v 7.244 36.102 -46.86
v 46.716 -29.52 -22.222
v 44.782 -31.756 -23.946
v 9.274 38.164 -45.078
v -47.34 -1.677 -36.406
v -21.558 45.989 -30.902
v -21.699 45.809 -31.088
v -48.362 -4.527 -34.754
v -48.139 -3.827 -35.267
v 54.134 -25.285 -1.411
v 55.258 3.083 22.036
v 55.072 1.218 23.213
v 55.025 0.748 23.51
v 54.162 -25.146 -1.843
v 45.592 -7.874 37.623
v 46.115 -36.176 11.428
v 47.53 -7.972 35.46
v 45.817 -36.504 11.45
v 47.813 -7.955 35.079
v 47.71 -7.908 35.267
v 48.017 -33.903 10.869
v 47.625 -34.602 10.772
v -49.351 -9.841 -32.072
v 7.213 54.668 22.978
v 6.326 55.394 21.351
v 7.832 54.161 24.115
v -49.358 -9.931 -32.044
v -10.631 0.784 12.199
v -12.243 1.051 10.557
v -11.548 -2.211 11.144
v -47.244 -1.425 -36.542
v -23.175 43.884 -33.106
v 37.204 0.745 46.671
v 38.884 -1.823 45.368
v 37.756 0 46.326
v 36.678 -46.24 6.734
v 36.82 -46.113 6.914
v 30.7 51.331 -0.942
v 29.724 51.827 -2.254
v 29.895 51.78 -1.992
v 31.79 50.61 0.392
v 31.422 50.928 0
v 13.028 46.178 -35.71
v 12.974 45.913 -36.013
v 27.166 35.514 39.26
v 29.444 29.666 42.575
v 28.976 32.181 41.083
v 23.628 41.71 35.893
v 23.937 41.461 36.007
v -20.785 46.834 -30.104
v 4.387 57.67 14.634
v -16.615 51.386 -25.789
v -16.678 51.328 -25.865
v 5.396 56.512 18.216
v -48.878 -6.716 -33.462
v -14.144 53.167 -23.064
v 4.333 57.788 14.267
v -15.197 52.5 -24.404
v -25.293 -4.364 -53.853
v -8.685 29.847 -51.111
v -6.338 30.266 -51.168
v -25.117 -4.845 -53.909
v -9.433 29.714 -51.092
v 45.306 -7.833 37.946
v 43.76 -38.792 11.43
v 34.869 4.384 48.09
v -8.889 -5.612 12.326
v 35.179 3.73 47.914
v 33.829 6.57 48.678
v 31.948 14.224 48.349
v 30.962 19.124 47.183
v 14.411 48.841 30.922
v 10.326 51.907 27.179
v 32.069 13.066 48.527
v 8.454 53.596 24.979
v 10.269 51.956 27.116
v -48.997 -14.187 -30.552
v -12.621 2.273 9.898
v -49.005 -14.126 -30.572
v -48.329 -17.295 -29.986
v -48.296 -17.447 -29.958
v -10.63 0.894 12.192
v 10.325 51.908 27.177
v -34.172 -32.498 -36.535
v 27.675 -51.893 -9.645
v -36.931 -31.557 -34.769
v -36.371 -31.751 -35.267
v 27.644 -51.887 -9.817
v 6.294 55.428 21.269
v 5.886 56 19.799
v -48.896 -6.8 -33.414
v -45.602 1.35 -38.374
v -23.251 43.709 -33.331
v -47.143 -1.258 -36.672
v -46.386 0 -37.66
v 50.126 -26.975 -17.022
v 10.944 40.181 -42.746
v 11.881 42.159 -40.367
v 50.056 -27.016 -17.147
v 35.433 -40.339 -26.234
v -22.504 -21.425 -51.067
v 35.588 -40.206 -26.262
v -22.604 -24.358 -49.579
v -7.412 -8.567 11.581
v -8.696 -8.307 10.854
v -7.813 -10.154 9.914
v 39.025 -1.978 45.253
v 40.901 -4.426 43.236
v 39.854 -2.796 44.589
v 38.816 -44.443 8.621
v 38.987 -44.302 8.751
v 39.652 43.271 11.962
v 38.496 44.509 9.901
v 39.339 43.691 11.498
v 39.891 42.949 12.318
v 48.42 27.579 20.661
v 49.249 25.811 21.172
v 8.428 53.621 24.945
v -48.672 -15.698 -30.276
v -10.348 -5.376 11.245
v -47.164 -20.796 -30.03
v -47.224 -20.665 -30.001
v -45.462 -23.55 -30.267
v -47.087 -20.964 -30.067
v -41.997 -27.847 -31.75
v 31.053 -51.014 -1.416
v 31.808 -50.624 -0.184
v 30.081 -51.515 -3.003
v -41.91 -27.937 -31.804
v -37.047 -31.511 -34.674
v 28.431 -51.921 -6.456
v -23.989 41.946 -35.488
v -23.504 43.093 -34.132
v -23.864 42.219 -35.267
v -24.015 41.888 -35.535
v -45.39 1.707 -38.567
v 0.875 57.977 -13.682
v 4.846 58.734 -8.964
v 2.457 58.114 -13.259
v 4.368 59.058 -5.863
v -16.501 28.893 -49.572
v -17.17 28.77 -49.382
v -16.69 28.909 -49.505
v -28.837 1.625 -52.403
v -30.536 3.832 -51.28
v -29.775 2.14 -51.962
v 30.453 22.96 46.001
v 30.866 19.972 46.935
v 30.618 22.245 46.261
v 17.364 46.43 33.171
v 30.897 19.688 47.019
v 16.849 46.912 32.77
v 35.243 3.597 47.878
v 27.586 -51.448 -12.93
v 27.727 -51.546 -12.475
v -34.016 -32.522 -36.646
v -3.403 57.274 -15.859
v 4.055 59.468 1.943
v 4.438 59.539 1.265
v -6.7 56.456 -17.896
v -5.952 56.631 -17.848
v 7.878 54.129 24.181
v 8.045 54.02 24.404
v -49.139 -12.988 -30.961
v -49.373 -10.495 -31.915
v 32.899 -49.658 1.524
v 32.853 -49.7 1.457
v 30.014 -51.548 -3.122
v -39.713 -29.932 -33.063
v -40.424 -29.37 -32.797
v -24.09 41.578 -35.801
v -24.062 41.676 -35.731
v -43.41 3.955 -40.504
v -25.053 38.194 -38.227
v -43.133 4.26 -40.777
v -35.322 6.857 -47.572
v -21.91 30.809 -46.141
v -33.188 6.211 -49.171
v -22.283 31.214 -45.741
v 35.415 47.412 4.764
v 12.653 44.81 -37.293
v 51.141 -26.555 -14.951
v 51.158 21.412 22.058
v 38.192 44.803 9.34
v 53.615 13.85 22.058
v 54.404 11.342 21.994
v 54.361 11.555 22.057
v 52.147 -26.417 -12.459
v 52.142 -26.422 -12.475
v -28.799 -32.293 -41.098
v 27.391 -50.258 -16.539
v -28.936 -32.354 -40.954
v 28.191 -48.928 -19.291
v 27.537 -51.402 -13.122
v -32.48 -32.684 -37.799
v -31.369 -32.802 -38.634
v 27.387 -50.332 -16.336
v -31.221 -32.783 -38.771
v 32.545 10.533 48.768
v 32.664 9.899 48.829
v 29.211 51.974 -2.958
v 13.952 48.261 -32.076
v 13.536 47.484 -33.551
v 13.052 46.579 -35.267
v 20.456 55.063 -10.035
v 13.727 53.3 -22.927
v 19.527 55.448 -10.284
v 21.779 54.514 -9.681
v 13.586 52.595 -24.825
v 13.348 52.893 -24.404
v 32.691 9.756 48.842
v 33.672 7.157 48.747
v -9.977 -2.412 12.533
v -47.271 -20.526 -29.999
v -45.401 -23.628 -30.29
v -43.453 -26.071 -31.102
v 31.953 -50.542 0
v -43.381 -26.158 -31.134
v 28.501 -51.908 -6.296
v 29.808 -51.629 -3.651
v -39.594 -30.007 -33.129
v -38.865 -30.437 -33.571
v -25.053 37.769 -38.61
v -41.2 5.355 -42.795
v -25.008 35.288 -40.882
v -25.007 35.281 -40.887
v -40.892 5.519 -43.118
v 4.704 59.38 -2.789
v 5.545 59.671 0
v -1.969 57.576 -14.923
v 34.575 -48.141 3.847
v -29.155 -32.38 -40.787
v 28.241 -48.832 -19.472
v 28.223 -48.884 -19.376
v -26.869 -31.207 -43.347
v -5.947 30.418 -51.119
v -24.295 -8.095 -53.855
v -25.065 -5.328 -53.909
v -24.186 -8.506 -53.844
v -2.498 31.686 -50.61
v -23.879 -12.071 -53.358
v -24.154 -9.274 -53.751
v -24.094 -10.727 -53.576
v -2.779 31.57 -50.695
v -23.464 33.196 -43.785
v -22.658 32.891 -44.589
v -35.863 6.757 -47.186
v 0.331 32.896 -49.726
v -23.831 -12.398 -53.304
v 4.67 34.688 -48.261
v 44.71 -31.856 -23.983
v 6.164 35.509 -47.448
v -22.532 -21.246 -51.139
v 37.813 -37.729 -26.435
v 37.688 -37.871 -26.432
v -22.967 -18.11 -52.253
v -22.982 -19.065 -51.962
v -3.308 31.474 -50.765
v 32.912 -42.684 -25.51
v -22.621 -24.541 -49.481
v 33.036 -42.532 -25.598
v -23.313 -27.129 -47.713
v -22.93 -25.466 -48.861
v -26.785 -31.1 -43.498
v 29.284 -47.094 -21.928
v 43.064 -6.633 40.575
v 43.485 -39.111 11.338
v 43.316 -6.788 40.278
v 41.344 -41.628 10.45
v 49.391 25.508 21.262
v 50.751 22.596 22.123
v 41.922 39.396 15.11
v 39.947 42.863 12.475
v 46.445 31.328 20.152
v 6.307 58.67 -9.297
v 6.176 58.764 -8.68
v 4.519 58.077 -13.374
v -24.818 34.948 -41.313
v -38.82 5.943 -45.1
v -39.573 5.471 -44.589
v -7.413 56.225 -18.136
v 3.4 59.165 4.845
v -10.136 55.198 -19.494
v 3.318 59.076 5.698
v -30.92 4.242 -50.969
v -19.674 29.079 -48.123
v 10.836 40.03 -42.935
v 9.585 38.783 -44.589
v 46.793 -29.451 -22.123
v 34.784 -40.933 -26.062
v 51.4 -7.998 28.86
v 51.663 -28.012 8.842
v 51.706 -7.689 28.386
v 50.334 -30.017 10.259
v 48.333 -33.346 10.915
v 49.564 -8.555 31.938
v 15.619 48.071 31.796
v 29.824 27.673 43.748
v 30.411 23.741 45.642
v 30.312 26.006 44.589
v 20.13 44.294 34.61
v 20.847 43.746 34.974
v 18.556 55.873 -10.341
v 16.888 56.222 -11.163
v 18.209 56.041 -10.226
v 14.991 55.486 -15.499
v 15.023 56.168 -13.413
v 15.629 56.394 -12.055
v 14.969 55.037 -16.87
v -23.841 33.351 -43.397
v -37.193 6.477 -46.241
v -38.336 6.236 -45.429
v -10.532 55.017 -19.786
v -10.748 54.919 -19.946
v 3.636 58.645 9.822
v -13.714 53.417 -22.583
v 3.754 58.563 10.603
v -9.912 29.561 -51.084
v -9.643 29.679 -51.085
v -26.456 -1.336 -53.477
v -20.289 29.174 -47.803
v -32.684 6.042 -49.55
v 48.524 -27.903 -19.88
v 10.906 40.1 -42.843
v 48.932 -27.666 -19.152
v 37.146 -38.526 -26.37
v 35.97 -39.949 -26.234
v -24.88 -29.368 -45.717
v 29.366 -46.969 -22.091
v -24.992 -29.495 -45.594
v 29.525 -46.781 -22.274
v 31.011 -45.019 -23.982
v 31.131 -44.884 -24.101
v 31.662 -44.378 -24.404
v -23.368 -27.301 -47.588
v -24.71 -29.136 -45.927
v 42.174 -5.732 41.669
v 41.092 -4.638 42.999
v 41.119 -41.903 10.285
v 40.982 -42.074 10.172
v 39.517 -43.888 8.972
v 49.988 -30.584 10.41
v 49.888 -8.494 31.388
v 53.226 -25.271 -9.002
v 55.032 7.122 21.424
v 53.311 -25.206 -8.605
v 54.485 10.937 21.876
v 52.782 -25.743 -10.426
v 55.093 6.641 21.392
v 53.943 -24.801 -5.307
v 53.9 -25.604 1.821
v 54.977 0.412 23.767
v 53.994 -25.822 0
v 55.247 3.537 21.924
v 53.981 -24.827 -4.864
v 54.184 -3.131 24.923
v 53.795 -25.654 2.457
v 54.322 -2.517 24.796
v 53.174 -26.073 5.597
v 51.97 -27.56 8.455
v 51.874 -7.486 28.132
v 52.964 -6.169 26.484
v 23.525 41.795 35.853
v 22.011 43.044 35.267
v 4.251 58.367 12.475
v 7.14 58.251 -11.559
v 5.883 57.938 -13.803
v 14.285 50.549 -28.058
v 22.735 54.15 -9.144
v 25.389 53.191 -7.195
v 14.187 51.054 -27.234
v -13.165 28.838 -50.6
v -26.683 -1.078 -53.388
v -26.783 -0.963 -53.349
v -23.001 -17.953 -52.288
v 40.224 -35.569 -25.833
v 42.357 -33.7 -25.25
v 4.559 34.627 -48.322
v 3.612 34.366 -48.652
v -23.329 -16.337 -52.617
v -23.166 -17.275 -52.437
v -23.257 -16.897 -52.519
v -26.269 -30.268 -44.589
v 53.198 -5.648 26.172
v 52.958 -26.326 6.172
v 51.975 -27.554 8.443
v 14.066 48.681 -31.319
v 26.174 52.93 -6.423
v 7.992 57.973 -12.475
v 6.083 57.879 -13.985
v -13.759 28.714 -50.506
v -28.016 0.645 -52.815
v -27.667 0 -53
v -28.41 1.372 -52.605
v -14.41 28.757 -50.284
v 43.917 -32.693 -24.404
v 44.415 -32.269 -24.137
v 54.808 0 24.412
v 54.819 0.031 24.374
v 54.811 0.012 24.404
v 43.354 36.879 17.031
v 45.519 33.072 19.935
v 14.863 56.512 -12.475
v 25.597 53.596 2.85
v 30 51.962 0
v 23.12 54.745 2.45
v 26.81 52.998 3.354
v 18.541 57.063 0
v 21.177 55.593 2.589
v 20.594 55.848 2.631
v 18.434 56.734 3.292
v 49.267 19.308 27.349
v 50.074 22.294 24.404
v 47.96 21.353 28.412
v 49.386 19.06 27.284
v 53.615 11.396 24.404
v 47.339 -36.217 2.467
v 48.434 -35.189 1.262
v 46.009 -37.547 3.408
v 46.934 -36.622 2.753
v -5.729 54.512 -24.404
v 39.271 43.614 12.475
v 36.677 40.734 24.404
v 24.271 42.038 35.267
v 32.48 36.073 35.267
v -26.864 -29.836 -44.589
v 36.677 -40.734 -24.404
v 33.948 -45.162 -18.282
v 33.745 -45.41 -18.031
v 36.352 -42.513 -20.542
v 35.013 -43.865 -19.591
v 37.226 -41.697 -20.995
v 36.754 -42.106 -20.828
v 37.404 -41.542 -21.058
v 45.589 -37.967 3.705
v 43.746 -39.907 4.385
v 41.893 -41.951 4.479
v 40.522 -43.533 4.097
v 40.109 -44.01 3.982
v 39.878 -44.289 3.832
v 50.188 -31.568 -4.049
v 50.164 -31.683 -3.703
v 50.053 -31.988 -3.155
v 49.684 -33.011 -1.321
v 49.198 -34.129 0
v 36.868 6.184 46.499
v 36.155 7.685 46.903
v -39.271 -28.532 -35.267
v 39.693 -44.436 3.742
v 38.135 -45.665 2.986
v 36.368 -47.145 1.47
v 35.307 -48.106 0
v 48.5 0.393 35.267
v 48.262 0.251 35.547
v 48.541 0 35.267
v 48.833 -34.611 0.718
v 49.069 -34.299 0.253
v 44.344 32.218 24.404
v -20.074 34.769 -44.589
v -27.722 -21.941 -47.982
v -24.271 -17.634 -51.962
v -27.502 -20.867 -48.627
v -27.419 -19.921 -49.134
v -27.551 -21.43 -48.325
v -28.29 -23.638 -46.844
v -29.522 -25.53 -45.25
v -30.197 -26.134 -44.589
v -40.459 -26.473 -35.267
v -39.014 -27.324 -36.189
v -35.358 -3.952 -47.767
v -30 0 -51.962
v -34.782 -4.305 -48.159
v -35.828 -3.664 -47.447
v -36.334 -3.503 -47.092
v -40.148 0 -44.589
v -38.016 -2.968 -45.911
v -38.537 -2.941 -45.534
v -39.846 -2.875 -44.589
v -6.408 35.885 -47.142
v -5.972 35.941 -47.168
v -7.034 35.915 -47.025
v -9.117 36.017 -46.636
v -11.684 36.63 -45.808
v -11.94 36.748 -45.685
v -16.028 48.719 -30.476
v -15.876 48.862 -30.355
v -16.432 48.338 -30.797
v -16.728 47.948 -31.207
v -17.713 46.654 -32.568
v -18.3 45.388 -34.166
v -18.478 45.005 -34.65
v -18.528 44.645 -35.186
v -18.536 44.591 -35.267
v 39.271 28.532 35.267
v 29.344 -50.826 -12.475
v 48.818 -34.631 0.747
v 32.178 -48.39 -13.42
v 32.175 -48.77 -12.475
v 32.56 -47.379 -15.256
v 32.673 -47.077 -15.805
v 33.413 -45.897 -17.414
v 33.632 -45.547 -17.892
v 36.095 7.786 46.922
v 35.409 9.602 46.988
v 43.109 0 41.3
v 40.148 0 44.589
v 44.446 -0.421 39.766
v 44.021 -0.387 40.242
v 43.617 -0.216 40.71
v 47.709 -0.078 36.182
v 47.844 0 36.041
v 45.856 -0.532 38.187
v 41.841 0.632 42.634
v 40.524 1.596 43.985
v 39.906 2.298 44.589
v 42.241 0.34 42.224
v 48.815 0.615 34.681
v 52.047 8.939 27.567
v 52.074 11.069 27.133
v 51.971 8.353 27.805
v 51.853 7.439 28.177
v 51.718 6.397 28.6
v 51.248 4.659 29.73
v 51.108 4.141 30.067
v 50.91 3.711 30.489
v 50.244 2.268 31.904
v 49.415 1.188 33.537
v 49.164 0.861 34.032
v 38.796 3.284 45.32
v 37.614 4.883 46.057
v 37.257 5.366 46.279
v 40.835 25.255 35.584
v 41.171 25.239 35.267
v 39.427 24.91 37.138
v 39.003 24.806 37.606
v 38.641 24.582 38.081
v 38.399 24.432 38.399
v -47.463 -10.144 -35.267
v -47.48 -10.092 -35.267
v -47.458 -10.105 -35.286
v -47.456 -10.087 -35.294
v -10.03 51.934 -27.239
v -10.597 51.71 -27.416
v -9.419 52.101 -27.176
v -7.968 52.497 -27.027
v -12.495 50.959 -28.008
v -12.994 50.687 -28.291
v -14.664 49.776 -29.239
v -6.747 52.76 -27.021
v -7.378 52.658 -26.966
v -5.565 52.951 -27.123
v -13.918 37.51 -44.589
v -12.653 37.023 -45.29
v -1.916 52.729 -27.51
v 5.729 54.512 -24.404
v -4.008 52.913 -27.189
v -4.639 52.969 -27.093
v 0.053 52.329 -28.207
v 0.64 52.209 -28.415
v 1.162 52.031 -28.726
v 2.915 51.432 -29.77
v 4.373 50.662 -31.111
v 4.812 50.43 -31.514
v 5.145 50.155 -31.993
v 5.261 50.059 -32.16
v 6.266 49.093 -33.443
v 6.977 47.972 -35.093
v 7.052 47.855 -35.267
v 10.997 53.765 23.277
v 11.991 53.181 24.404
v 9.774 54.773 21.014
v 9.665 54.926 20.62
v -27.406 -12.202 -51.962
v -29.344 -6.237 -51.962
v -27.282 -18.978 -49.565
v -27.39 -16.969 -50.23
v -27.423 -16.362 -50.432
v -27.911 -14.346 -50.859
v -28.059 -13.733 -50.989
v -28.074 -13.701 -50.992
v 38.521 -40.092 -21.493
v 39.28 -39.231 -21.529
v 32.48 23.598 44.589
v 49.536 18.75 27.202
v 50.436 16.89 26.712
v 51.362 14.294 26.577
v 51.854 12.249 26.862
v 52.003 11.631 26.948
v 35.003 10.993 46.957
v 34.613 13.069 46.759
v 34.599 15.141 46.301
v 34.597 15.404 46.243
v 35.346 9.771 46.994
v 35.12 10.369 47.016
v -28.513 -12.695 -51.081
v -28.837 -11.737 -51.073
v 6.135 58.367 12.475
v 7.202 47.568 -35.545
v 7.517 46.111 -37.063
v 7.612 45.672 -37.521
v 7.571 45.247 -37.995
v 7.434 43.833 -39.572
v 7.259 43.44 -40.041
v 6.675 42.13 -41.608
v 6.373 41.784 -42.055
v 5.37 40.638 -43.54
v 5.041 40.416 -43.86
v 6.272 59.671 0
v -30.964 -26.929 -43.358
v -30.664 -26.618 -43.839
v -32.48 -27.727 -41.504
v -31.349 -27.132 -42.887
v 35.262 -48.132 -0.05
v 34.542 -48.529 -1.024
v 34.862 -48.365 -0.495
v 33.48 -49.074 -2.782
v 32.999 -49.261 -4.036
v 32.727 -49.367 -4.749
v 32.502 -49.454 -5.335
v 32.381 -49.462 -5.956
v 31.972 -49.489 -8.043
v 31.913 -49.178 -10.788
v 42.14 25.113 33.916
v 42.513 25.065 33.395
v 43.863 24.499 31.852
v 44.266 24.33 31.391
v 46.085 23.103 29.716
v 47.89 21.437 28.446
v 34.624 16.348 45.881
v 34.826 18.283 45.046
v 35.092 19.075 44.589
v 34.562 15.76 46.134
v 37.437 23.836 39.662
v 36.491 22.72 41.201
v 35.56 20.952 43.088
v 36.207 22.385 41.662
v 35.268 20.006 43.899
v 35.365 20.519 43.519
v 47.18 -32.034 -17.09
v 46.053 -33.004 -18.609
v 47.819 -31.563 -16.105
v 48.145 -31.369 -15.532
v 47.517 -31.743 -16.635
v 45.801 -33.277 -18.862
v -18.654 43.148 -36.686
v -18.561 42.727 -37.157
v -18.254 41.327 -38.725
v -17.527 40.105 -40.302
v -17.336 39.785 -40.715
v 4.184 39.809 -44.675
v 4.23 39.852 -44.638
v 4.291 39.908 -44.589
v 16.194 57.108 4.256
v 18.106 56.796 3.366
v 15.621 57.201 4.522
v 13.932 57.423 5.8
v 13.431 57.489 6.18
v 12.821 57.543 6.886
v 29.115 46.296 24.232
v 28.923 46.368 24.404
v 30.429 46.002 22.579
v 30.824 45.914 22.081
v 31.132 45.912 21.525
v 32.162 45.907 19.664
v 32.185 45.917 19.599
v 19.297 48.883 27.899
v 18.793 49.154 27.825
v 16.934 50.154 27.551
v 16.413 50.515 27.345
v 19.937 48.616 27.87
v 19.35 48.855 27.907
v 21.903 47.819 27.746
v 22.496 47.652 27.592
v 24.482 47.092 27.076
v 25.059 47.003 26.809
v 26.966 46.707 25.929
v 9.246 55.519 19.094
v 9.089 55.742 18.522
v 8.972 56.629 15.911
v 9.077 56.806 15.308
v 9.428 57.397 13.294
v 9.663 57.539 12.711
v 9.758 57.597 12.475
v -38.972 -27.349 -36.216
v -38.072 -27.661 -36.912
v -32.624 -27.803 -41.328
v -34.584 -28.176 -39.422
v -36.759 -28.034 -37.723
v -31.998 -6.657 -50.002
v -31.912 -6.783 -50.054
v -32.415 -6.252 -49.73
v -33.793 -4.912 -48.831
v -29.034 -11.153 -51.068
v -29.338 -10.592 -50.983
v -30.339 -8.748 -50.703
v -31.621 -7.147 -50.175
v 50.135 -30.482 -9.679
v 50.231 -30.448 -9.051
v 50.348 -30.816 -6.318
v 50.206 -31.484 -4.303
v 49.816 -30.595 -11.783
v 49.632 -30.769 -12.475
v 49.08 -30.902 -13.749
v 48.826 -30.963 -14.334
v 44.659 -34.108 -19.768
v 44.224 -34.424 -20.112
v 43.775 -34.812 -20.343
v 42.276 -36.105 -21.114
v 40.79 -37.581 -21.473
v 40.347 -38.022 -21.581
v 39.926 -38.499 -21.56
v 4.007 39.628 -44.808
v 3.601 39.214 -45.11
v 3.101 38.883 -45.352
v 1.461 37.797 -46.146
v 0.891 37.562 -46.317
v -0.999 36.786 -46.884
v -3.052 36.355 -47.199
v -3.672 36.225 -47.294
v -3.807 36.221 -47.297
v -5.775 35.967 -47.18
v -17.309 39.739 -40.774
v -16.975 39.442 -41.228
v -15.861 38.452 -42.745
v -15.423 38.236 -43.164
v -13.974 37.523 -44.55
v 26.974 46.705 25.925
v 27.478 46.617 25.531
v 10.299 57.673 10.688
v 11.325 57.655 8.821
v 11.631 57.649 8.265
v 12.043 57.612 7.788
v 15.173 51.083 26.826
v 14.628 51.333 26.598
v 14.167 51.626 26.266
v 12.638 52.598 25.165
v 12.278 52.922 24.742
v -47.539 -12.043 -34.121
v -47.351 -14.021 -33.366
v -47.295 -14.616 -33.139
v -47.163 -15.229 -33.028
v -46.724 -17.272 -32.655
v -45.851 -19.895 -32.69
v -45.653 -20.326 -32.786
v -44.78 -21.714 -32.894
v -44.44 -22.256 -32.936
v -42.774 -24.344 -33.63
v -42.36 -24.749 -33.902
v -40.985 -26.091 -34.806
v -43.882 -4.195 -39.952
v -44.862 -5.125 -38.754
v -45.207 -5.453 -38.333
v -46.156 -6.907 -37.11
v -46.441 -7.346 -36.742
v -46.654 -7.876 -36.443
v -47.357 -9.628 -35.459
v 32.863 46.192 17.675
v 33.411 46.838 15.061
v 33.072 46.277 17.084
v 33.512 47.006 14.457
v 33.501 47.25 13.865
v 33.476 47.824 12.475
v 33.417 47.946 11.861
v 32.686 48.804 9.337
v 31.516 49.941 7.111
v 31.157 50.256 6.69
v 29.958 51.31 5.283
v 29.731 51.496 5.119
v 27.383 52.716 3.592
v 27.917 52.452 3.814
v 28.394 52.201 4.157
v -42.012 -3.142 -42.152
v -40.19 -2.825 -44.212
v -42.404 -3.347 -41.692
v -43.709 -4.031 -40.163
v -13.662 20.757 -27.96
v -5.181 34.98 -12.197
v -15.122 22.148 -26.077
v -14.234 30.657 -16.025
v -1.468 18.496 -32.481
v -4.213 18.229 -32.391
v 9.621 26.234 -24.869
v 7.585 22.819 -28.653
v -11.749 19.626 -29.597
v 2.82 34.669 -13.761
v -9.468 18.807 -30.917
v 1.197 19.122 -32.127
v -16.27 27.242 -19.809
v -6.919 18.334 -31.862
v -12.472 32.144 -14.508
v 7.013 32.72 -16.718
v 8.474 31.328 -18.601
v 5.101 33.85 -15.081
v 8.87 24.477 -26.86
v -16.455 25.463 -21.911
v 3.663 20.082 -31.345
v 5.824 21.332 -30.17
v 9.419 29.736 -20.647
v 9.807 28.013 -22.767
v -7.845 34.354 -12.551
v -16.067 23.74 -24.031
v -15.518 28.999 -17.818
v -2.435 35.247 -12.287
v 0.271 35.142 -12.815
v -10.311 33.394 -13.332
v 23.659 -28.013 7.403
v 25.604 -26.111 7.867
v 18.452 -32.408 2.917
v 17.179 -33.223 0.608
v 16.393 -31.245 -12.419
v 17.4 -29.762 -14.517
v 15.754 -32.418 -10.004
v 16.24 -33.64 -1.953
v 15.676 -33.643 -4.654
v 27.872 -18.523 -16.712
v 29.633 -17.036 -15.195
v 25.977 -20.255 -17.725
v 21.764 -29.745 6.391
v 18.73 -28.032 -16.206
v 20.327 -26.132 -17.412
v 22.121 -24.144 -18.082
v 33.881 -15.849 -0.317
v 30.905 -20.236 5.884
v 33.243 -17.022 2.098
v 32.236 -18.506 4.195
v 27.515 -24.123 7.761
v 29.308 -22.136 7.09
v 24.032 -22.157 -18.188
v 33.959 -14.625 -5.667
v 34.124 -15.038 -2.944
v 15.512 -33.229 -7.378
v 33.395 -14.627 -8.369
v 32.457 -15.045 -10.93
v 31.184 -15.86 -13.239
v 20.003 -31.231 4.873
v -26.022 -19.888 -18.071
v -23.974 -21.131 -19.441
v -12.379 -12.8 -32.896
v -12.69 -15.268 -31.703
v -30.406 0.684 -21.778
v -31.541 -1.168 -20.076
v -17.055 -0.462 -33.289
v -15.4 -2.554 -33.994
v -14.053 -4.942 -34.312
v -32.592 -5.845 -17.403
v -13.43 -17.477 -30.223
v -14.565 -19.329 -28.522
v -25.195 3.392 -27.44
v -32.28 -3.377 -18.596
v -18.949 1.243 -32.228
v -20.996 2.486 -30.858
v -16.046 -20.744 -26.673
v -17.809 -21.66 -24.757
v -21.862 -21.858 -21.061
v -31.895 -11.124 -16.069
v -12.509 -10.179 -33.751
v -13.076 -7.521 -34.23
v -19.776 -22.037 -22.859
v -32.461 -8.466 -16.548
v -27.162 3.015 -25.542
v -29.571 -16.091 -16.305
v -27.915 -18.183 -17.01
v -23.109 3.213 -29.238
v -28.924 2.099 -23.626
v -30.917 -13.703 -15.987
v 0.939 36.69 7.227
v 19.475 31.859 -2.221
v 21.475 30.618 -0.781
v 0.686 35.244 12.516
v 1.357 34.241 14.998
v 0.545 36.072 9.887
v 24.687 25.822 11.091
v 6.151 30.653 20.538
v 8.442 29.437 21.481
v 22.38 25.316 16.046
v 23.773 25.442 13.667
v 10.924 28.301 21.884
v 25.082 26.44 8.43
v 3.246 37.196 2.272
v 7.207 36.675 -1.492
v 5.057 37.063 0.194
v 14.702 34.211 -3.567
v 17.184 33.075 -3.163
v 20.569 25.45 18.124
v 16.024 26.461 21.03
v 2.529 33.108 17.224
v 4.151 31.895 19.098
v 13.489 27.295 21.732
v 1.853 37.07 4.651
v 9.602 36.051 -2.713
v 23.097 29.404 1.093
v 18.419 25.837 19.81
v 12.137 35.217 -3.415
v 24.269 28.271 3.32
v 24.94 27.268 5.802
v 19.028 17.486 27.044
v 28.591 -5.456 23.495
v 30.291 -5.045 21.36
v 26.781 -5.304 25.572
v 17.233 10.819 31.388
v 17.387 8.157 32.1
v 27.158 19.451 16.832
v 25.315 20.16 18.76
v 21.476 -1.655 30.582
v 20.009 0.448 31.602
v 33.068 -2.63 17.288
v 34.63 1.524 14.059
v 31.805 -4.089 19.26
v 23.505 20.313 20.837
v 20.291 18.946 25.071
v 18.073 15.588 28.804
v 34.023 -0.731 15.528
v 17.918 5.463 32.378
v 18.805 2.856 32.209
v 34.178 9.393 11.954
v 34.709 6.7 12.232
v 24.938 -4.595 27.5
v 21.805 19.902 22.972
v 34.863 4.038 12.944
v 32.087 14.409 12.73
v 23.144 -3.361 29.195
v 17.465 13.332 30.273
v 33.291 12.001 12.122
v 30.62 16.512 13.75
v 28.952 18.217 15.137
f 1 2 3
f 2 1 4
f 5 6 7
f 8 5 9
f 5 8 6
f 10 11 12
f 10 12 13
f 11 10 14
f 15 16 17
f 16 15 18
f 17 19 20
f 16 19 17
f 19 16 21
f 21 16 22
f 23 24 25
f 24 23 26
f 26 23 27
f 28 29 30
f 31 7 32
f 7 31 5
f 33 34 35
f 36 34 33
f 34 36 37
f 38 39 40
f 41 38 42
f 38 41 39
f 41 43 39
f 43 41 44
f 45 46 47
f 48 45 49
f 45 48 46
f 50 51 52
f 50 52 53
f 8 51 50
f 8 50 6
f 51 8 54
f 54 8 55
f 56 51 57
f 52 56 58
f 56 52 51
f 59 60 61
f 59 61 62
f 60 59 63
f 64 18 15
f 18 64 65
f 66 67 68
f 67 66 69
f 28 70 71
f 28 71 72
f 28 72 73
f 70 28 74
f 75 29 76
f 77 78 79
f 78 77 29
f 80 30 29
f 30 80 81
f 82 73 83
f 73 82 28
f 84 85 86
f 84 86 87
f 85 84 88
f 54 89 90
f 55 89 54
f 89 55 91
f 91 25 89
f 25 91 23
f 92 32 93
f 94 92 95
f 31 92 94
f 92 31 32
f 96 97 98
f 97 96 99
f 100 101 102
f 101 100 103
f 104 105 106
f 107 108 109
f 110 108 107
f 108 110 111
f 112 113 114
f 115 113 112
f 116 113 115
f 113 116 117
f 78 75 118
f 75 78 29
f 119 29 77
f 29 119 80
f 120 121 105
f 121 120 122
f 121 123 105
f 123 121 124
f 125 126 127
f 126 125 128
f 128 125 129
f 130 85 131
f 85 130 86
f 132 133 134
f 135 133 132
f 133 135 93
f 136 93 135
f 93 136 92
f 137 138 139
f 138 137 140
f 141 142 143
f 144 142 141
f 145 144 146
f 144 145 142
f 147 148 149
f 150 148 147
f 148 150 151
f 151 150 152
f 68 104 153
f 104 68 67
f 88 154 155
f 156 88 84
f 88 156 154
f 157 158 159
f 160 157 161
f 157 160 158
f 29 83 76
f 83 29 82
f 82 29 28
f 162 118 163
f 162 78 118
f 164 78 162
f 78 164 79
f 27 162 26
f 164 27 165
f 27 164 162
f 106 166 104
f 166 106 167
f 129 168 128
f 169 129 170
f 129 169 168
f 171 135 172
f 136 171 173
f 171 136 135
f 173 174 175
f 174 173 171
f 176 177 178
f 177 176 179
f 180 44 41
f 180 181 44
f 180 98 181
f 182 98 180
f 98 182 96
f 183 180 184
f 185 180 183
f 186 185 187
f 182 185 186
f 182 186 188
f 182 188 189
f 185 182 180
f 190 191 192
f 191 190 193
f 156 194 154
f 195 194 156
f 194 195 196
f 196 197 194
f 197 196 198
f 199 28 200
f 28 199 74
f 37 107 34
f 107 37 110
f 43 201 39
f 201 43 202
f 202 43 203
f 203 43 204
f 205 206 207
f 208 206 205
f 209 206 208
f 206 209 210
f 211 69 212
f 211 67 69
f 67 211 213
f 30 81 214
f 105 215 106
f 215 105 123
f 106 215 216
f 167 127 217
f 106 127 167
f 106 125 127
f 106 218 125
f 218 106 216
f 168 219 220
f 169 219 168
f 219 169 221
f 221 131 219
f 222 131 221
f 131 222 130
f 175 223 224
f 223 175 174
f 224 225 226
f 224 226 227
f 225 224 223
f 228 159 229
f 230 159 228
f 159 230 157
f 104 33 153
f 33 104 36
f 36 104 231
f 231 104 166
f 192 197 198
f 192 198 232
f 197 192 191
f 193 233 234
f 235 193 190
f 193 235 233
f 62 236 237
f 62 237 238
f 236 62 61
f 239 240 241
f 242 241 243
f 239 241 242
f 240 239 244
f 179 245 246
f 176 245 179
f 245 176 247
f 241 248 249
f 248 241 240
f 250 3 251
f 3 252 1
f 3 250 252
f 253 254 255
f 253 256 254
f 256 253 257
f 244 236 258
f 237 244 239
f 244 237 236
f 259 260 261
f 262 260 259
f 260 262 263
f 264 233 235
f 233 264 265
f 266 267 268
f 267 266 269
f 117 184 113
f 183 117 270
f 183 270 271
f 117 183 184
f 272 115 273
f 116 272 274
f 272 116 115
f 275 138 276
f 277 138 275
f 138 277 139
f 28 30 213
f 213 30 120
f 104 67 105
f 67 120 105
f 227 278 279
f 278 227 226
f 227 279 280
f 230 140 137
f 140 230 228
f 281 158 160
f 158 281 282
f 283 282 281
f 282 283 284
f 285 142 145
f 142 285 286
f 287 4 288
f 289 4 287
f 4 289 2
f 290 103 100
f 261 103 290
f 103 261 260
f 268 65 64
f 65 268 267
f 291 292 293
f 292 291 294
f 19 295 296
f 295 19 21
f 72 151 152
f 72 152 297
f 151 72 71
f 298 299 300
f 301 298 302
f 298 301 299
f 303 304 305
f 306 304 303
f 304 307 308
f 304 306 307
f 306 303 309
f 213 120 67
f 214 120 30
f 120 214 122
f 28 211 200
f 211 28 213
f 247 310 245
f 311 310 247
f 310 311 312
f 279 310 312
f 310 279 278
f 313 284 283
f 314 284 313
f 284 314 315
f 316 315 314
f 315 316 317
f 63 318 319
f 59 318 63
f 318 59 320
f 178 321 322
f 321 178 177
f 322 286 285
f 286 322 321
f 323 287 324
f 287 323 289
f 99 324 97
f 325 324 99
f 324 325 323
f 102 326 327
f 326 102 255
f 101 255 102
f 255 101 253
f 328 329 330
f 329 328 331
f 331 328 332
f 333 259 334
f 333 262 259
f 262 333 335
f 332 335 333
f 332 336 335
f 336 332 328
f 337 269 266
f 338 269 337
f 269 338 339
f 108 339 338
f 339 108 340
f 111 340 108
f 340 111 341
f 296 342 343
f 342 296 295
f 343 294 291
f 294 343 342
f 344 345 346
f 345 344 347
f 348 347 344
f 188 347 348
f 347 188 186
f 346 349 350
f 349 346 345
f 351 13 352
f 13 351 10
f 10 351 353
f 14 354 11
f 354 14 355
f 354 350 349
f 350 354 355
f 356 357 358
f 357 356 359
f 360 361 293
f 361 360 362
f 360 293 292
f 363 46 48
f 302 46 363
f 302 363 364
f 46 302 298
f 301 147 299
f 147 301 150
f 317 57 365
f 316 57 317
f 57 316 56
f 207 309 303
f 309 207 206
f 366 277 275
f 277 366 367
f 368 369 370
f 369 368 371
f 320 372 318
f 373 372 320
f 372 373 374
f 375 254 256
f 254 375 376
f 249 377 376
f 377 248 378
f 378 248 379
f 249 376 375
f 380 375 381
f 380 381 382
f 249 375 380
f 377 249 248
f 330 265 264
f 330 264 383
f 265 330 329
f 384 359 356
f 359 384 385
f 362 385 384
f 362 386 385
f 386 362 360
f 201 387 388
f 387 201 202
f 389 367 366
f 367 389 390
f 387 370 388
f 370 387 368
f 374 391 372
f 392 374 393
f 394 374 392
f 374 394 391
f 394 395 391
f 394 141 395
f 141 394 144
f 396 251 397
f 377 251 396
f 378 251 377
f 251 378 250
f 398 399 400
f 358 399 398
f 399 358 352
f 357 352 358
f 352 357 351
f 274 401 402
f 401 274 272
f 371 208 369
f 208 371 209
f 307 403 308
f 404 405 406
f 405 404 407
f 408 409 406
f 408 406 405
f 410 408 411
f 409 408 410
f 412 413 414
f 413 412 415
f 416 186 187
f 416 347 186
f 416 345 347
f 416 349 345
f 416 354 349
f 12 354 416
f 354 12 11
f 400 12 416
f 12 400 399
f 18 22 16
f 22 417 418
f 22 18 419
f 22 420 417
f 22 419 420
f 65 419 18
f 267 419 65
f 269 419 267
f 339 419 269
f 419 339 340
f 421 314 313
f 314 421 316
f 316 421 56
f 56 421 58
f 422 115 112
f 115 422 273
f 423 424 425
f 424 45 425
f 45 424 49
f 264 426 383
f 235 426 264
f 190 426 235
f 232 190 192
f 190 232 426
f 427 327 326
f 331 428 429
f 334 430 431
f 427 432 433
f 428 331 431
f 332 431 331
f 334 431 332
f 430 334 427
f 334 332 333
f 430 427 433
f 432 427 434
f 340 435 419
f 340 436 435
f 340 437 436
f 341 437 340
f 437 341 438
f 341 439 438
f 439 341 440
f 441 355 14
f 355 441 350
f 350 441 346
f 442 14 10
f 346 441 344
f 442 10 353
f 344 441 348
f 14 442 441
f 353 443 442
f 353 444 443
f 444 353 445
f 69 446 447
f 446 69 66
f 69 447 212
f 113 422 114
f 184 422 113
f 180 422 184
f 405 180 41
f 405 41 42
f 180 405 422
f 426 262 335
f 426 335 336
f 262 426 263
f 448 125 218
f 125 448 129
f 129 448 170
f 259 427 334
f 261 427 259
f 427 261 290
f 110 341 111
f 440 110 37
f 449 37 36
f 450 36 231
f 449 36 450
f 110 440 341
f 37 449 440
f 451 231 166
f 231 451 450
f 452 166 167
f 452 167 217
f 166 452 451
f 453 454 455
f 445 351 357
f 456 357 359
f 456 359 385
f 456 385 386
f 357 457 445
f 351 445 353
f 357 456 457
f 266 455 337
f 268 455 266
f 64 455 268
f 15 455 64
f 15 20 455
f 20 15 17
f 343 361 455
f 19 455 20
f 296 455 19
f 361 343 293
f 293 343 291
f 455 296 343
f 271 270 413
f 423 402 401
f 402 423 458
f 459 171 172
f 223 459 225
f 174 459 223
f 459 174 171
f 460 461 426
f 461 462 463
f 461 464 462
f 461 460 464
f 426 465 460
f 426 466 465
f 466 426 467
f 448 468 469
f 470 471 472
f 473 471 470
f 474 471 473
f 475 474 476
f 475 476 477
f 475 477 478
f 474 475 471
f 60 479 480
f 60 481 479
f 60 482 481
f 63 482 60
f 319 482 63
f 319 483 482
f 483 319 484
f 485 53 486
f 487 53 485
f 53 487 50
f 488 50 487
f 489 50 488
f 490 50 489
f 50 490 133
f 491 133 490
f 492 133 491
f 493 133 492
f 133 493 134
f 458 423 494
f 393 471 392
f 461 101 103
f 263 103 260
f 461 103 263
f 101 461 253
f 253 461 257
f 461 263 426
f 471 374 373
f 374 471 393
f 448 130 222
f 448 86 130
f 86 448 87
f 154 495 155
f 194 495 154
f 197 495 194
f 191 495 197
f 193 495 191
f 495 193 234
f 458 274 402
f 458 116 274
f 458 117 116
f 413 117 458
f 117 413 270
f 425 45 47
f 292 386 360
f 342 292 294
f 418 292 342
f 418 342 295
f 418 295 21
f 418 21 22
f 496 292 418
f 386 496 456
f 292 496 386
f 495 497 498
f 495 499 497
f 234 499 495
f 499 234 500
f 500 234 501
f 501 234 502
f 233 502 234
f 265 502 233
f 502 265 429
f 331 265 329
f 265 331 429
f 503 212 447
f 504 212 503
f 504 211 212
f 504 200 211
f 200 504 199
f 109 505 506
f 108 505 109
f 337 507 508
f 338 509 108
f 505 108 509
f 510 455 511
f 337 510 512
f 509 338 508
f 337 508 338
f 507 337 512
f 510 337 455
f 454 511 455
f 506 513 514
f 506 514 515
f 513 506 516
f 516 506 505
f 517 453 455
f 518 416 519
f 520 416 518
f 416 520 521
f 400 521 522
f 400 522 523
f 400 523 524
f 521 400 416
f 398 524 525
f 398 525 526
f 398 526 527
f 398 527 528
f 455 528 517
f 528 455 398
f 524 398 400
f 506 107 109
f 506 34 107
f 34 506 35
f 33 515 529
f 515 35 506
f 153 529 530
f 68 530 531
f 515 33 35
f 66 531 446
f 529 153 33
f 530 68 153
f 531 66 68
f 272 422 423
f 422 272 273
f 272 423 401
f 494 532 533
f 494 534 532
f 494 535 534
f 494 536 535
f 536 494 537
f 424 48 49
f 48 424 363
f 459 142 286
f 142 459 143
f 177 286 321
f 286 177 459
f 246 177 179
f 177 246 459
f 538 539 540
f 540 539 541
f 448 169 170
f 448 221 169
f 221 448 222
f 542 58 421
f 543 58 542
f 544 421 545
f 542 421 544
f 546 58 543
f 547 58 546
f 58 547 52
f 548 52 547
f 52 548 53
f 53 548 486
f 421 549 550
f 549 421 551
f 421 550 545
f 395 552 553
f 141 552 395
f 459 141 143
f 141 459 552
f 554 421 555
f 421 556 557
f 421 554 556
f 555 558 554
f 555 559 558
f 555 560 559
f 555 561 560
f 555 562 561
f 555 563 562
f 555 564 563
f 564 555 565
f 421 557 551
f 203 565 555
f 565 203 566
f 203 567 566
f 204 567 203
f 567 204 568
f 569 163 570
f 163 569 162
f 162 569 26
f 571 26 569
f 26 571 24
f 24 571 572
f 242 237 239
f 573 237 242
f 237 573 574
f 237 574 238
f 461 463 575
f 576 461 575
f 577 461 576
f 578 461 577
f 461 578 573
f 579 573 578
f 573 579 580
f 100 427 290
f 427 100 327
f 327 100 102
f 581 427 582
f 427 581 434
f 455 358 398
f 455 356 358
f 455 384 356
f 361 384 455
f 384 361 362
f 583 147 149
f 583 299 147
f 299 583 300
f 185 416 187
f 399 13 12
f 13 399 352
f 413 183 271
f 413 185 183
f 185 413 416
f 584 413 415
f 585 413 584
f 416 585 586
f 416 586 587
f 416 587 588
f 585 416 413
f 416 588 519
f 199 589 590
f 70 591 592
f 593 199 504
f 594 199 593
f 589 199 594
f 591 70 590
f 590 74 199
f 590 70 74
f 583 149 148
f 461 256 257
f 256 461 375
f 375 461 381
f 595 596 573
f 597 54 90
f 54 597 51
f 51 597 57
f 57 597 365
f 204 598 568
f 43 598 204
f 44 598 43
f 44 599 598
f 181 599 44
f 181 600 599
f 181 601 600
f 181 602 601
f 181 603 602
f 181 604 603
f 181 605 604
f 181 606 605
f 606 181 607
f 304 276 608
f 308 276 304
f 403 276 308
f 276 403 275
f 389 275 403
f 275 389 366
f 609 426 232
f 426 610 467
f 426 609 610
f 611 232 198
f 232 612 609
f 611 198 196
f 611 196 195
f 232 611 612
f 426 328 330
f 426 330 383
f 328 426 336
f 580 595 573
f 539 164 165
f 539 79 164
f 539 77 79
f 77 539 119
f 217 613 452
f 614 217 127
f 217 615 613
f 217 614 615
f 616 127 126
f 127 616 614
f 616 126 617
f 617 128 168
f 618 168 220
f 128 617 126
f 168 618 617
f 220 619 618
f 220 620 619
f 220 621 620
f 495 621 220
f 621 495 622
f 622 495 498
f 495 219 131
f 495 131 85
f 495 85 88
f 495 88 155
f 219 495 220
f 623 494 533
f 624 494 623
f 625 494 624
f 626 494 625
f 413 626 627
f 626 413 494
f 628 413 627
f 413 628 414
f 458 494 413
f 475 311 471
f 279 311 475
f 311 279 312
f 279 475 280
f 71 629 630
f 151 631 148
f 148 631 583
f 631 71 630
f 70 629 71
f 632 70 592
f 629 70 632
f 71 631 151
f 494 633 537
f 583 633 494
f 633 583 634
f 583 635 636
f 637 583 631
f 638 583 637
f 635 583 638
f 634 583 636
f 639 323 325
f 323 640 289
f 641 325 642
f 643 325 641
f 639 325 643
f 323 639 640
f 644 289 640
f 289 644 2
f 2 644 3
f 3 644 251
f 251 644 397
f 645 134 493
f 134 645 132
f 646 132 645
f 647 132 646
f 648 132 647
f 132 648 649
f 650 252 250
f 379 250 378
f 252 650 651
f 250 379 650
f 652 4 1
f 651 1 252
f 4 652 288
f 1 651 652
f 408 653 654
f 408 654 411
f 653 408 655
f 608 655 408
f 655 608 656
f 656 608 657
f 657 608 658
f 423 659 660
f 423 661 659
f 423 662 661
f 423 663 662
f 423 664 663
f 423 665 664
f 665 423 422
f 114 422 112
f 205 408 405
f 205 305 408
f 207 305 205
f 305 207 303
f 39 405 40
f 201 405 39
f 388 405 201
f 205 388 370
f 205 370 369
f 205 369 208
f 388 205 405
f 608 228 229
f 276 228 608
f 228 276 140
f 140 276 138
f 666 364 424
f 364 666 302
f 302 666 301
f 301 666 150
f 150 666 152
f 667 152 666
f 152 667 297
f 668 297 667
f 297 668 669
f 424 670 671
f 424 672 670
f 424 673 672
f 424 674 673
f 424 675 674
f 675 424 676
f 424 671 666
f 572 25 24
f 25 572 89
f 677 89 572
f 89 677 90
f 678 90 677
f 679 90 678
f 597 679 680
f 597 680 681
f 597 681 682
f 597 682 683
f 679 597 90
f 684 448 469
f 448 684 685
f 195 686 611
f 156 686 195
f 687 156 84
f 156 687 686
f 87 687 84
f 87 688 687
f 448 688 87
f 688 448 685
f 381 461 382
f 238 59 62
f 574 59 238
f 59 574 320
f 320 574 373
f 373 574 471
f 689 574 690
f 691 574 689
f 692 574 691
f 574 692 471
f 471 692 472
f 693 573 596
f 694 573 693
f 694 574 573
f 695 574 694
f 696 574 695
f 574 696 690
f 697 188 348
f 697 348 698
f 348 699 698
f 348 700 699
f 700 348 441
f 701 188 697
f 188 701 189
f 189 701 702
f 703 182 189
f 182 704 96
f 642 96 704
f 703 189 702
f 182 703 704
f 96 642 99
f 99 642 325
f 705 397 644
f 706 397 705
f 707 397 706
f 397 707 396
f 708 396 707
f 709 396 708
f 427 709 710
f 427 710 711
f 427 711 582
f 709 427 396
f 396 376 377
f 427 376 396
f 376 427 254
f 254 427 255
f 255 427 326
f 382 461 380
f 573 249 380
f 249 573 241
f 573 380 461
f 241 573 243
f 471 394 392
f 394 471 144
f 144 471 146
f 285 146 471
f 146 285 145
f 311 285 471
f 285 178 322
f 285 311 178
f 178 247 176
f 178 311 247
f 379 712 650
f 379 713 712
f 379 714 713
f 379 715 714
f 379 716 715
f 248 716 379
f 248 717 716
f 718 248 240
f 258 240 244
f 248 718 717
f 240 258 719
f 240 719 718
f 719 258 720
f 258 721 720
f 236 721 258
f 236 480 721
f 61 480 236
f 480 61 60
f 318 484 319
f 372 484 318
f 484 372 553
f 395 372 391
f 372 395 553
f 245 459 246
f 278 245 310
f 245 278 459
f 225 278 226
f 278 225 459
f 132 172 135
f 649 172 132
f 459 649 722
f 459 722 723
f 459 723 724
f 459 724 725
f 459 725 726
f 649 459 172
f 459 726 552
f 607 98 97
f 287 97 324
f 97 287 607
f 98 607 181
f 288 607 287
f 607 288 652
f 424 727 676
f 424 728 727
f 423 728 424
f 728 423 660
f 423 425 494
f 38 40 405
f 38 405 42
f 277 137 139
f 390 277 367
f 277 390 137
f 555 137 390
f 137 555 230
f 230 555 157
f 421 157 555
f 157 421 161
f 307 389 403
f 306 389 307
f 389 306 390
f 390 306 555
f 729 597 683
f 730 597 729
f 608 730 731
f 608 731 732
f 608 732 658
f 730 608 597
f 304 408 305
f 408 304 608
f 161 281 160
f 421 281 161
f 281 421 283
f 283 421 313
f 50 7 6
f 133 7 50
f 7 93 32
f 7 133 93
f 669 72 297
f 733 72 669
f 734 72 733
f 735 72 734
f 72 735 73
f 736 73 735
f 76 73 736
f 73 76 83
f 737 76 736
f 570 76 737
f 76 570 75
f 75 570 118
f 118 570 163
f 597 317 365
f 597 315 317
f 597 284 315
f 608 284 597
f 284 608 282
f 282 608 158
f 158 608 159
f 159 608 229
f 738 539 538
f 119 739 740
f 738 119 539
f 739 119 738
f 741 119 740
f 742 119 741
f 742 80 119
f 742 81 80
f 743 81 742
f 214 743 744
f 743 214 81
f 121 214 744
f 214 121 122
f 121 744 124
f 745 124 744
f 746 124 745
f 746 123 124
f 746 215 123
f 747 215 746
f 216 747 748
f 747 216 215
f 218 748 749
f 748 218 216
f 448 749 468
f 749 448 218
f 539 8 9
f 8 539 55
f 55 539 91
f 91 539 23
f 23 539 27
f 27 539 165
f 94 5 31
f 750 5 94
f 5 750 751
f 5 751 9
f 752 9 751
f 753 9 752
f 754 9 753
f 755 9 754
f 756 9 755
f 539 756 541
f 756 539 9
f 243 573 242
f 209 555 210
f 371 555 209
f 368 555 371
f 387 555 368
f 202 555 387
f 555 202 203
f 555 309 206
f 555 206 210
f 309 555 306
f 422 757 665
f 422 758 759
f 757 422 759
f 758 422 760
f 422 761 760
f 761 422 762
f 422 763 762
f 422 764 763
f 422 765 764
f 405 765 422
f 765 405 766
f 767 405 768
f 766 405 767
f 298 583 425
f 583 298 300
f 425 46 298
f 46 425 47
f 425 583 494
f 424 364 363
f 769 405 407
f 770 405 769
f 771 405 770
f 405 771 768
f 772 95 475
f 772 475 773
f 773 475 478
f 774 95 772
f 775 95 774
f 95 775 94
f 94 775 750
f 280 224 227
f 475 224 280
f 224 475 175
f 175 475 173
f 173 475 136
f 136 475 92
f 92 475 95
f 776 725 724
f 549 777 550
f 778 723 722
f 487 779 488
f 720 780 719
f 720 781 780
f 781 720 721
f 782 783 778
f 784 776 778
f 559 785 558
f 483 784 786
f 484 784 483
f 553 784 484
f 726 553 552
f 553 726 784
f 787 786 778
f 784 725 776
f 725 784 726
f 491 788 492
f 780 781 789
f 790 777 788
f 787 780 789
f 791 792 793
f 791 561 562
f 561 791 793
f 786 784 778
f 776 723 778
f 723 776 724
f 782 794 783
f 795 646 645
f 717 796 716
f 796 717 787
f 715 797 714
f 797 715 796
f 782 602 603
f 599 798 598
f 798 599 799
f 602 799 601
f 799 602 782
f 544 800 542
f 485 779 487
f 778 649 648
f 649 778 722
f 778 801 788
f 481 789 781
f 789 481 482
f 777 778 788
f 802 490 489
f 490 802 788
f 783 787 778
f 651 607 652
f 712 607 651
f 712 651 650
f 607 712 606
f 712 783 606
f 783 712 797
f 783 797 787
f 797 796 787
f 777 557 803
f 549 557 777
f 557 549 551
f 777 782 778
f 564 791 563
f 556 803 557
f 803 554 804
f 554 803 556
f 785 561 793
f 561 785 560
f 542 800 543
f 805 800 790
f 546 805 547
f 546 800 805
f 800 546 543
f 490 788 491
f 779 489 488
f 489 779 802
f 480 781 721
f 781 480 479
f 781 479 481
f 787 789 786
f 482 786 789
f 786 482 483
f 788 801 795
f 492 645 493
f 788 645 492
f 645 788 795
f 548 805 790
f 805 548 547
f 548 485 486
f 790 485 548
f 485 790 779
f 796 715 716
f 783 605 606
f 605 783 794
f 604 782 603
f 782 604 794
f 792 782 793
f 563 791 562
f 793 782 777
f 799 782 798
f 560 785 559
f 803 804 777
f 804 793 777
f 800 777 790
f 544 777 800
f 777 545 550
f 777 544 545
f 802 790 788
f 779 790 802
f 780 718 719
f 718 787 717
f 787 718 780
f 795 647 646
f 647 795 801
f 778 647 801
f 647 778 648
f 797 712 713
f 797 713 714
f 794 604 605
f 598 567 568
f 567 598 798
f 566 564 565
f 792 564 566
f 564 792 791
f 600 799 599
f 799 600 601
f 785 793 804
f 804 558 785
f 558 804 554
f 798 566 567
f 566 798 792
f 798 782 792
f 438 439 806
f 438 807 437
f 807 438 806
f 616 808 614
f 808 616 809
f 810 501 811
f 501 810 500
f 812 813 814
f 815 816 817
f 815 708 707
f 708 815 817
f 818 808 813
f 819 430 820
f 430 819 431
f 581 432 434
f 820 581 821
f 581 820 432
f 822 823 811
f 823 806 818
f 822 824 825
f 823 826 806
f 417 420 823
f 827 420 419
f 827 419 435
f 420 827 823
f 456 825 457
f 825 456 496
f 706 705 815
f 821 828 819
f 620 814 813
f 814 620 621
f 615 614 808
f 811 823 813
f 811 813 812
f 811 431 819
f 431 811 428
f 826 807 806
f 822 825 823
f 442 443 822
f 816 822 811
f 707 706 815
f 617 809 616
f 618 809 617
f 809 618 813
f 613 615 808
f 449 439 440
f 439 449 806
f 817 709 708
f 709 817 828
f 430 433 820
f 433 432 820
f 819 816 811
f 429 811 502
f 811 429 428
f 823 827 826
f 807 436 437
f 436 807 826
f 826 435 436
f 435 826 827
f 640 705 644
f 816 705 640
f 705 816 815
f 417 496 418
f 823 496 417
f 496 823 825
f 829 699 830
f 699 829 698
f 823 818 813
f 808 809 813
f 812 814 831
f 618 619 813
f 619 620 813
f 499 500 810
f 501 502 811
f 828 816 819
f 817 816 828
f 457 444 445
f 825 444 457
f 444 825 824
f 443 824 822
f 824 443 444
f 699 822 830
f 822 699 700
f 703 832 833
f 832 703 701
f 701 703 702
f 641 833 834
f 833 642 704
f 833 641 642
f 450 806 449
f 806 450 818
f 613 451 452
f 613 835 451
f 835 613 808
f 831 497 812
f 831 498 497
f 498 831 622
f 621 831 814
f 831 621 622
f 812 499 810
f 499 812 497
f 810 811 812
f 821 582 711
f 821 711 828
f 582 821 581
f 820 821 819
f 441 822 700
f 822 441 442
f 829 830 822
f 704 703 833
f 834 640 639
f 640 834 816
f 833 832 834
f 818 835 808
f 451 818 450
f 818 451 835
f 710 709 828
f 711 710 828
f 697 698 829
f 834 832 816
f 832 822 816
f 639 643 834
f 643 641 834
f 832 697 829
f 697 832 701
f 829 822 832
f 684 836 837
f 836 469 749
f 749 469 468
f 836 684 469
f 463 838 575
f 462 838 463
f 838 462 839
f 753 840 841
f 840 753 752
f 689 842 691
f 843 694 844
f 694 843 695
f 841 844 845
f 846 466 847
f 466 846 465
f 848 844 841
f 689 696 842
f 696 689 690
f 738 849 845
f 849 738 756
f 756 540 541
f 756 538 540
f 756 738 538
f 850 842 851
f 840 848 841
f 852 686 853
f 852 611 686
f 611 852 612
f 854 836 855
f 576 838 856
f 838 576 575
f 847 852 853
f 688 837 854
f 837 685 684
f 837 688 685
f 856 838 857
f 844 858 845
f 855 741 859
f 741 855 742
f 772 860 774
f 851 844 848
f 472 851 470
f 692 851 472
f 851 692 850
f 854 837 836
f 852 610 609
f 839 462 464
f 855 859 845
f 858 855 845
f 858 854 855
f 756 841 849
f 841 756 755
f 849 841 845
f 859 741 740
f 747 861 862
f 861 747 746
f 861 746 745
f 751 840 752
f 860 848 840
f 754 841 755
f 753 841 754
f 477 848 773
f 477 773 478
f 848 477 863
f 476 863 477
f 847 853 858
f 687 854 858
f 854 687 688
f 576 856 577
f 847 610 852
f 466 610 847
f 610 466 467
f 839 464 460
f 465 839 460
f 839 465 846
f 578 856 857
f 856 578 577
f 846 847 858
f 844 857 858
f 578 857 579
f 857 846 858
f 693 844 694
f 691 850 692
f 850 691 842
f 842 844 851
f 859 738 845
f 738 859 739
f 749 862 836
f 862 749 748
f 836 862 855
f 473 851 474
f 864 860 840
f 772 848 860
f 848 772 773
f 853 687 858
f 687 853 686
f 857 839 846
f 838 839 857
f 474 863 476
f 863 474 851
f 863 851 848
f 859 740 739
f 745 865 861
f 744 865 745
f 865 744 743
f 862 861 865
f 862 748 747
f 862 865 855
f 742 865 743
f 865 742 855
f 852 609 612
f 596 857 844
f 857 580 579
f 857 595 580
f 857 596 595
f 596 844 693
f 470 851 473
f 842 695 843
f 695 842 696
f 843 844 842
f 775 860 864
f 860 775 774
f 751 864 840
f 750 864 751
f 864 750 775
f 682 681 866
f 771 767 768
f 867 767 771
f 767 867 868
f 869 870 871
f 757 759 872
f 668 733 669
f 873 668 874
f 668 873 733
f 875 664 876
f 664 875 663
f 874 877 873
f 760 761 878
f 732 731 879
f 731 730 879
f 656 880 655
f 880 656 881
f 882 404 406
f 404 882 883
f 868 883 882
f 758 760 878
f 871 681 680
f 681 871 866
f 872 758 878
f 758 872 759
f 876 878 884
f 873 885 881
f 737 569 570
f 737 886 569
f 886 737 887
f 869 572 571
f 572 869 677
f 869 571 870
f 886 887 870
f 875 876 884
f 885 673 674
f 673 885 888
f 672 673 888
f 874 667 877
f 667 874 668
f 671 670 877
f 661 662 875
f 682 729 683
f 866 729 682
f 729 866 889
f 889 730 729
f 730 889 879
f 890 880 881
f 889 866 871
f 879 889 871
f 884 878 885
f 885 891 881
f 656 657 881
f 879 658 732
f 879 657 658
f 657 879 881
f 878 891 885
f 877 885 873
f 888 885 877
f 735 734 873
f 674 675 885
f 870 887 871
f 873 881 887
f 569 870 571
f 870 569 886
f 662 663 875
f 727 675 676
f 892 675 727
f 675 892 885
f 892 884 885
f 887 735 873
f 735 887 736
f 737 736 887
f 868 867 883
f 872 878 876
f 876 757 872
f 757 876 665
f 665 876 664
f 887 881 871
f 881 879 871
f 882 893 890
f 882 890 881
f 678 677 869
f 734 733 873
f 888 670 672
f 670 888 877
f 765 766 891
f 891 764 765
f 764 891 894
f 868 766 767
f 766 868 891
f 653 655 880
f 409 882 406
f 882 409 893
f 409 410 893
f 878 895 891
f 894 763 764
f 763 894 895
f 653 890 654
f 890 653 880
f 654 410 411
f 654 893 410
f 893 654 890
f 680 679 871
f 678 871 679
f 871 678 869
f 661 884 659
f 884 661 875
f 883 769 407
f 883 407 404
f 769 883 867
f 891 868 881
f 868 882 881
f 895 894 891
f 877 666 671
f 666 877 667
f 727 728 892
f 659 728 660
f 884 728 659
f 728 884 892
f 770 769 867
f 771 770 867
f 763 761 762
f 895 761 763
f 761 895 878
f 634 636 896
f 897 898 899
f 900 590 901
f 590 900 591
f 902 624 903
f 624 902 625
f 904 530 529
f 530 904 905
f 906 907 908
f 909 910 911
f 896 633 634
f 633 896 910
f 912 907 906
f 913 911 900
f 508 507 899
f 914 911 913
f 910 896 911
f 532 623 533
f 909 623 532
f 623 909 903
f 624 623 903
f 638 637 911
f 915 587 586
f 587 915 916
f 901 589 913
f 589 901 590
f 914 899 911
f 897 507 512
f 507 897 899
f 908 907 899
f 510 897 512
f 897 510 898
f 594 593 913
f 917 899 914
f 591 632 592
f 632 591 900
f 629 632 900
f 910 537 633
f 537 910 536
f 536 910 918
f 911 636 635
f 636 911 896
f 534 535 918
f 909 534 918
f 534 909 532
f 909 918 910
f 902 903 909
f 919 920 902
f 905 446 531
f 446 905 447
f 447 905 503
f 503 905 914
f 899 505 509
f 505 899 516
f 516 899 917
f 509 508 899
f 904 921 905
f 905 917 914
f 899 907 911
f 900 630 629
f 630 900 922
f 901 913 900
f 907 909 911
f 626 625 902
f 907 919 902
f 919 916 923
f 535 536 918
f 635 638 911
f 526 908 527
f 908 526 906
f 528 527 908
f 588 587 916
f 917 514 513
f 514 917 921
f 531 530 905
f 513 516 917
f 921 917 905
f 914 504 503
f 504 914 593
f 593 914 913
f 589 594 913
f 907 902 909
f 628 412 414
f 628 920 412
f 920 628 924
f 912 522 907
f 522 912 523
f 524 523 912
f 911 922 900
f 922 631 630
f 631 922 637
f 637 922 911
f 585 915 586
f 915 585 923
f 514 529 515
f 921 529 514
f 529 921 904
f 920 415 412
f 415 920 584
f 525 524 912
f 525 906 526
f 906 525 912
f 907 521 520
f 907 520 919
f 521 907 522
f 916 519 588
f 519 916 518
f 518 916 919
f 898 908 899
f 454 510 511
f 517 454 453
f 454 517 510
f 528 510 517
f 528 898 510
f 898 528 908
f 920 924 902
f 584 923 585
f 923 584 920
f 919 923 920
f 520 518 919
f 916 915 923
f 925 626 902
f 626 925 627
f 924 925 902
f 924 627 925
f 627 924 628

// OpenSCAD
difference() {
	intersection() {
		hull() {
			rotate(a = -123.3588517168, v = [-0.5387586807, 0.6382553827, 0.0000000000]) {
				rotate(a = -90.0000000000, v = [0.0000000000, 1.0000000000, -0.0000000000]) {
					cylinder(h = 60, r = 16.2000000000);
				}
			}
			rotate(a = -123.3588517168, v = [-0.5387586807, 0.6382553827, 0.0000000000]) {
				rotate(a = -90.0000000000, v = [-0.8660254038, -0.5000000000, 0.0000000000]) {
					cylinder(h = 60, r = 16.2000000000);
				}
			}
			rotate(a = -123.3588517168, v = [-0.5387586807, 0.6382553827, 0.0000000000]) {
				rotate(a = -18.4383929552, v = [0.0090619990, 0.3161549461, -0.0000000000]) {
					cylinder(h = 60, r = 16.2000000000);
				}
			}
			rotate(a = -123.3588517168, v = [-0.5387586807, 0.6382553827, 0.0000000000]) {
				rotate(a = -149.1684967374, v = [0.1784688415, 0.4804378981, -0.0000000000]) {
					cylinder(h = 60, r = 16.2000000000);
				}
			}
			rotate(a = -123.3588517168, v = [-0.5387586807, 0.6382553827, 0.0000000000]) {
				rotate(a = -159.6517266695, v = [-0.1519712042, -0.3127585874, 0.0000000000]) {
					cylinder(h = 60, r = 16.2000000000);
				}
			}
		}
		sphere(r = 60);
	}
	union() {
		rotate(a = -123.3588517168, v = [-0.5387586807, 0.6382553827, 0.0000000000]) {
			rotate(a = -90.0000000000, v = [0.0000000000, 1.0000000000, -0.0000000000]) {
				translate(v = [0, 0, 35]) {
					cylinder(h = 100, r = 13.2000000000);
				}
			}
		}
		rotate(a = -123.3588517168, v = [-0.5387586807, 0.6382553827, 0.0000000000]) {
			rotate(a = -90.0000000000, v = [-0.8660254038, -0.5000000000, 0.0000000000]) {
				translate(v = [0, 0, 35]) {
					cylinder(h = 100, r = 13.2000000000);
				}
			}
		}
		rotate(a = -123.3588517168, v = [-0.5387586807, 0.6382553827, 0.0000000000]) {
			rotate(a = -18.4383929552, v = [0.0090619990, 0.3161549461, -0.0000000000]) {
				translate(v = [0, 0, 35]) {
					cylinder(h = 100, r = 13.2000000000);
				}
			}
		}
		rotate(a = -123.3588517168, v = [-0.5387586807, 0.6382553827, 0.0000000000]) {
			rotate(a = -149.1684967374, v = [0.1784688415, 0.4804378981, -0.0000000000]) {
				translate(v = [0, 0, 35]) {
					cylinder(h = 100, r = 13.2000000000);
				}
			}
		}
		rotate(a = -123.3588517168, v = [-0.5387586807, 0.6382553827, 0.0000000000]) {
			rotate(a = -159.6517266695, v = [-0.1519712042, -0.3127585874, 0.0000000000]) {
				translate(v = [0, 0, 35]) {
					cylinder(h = 100, r = 13.2000000000);
				}
			}
		}
	}
}
